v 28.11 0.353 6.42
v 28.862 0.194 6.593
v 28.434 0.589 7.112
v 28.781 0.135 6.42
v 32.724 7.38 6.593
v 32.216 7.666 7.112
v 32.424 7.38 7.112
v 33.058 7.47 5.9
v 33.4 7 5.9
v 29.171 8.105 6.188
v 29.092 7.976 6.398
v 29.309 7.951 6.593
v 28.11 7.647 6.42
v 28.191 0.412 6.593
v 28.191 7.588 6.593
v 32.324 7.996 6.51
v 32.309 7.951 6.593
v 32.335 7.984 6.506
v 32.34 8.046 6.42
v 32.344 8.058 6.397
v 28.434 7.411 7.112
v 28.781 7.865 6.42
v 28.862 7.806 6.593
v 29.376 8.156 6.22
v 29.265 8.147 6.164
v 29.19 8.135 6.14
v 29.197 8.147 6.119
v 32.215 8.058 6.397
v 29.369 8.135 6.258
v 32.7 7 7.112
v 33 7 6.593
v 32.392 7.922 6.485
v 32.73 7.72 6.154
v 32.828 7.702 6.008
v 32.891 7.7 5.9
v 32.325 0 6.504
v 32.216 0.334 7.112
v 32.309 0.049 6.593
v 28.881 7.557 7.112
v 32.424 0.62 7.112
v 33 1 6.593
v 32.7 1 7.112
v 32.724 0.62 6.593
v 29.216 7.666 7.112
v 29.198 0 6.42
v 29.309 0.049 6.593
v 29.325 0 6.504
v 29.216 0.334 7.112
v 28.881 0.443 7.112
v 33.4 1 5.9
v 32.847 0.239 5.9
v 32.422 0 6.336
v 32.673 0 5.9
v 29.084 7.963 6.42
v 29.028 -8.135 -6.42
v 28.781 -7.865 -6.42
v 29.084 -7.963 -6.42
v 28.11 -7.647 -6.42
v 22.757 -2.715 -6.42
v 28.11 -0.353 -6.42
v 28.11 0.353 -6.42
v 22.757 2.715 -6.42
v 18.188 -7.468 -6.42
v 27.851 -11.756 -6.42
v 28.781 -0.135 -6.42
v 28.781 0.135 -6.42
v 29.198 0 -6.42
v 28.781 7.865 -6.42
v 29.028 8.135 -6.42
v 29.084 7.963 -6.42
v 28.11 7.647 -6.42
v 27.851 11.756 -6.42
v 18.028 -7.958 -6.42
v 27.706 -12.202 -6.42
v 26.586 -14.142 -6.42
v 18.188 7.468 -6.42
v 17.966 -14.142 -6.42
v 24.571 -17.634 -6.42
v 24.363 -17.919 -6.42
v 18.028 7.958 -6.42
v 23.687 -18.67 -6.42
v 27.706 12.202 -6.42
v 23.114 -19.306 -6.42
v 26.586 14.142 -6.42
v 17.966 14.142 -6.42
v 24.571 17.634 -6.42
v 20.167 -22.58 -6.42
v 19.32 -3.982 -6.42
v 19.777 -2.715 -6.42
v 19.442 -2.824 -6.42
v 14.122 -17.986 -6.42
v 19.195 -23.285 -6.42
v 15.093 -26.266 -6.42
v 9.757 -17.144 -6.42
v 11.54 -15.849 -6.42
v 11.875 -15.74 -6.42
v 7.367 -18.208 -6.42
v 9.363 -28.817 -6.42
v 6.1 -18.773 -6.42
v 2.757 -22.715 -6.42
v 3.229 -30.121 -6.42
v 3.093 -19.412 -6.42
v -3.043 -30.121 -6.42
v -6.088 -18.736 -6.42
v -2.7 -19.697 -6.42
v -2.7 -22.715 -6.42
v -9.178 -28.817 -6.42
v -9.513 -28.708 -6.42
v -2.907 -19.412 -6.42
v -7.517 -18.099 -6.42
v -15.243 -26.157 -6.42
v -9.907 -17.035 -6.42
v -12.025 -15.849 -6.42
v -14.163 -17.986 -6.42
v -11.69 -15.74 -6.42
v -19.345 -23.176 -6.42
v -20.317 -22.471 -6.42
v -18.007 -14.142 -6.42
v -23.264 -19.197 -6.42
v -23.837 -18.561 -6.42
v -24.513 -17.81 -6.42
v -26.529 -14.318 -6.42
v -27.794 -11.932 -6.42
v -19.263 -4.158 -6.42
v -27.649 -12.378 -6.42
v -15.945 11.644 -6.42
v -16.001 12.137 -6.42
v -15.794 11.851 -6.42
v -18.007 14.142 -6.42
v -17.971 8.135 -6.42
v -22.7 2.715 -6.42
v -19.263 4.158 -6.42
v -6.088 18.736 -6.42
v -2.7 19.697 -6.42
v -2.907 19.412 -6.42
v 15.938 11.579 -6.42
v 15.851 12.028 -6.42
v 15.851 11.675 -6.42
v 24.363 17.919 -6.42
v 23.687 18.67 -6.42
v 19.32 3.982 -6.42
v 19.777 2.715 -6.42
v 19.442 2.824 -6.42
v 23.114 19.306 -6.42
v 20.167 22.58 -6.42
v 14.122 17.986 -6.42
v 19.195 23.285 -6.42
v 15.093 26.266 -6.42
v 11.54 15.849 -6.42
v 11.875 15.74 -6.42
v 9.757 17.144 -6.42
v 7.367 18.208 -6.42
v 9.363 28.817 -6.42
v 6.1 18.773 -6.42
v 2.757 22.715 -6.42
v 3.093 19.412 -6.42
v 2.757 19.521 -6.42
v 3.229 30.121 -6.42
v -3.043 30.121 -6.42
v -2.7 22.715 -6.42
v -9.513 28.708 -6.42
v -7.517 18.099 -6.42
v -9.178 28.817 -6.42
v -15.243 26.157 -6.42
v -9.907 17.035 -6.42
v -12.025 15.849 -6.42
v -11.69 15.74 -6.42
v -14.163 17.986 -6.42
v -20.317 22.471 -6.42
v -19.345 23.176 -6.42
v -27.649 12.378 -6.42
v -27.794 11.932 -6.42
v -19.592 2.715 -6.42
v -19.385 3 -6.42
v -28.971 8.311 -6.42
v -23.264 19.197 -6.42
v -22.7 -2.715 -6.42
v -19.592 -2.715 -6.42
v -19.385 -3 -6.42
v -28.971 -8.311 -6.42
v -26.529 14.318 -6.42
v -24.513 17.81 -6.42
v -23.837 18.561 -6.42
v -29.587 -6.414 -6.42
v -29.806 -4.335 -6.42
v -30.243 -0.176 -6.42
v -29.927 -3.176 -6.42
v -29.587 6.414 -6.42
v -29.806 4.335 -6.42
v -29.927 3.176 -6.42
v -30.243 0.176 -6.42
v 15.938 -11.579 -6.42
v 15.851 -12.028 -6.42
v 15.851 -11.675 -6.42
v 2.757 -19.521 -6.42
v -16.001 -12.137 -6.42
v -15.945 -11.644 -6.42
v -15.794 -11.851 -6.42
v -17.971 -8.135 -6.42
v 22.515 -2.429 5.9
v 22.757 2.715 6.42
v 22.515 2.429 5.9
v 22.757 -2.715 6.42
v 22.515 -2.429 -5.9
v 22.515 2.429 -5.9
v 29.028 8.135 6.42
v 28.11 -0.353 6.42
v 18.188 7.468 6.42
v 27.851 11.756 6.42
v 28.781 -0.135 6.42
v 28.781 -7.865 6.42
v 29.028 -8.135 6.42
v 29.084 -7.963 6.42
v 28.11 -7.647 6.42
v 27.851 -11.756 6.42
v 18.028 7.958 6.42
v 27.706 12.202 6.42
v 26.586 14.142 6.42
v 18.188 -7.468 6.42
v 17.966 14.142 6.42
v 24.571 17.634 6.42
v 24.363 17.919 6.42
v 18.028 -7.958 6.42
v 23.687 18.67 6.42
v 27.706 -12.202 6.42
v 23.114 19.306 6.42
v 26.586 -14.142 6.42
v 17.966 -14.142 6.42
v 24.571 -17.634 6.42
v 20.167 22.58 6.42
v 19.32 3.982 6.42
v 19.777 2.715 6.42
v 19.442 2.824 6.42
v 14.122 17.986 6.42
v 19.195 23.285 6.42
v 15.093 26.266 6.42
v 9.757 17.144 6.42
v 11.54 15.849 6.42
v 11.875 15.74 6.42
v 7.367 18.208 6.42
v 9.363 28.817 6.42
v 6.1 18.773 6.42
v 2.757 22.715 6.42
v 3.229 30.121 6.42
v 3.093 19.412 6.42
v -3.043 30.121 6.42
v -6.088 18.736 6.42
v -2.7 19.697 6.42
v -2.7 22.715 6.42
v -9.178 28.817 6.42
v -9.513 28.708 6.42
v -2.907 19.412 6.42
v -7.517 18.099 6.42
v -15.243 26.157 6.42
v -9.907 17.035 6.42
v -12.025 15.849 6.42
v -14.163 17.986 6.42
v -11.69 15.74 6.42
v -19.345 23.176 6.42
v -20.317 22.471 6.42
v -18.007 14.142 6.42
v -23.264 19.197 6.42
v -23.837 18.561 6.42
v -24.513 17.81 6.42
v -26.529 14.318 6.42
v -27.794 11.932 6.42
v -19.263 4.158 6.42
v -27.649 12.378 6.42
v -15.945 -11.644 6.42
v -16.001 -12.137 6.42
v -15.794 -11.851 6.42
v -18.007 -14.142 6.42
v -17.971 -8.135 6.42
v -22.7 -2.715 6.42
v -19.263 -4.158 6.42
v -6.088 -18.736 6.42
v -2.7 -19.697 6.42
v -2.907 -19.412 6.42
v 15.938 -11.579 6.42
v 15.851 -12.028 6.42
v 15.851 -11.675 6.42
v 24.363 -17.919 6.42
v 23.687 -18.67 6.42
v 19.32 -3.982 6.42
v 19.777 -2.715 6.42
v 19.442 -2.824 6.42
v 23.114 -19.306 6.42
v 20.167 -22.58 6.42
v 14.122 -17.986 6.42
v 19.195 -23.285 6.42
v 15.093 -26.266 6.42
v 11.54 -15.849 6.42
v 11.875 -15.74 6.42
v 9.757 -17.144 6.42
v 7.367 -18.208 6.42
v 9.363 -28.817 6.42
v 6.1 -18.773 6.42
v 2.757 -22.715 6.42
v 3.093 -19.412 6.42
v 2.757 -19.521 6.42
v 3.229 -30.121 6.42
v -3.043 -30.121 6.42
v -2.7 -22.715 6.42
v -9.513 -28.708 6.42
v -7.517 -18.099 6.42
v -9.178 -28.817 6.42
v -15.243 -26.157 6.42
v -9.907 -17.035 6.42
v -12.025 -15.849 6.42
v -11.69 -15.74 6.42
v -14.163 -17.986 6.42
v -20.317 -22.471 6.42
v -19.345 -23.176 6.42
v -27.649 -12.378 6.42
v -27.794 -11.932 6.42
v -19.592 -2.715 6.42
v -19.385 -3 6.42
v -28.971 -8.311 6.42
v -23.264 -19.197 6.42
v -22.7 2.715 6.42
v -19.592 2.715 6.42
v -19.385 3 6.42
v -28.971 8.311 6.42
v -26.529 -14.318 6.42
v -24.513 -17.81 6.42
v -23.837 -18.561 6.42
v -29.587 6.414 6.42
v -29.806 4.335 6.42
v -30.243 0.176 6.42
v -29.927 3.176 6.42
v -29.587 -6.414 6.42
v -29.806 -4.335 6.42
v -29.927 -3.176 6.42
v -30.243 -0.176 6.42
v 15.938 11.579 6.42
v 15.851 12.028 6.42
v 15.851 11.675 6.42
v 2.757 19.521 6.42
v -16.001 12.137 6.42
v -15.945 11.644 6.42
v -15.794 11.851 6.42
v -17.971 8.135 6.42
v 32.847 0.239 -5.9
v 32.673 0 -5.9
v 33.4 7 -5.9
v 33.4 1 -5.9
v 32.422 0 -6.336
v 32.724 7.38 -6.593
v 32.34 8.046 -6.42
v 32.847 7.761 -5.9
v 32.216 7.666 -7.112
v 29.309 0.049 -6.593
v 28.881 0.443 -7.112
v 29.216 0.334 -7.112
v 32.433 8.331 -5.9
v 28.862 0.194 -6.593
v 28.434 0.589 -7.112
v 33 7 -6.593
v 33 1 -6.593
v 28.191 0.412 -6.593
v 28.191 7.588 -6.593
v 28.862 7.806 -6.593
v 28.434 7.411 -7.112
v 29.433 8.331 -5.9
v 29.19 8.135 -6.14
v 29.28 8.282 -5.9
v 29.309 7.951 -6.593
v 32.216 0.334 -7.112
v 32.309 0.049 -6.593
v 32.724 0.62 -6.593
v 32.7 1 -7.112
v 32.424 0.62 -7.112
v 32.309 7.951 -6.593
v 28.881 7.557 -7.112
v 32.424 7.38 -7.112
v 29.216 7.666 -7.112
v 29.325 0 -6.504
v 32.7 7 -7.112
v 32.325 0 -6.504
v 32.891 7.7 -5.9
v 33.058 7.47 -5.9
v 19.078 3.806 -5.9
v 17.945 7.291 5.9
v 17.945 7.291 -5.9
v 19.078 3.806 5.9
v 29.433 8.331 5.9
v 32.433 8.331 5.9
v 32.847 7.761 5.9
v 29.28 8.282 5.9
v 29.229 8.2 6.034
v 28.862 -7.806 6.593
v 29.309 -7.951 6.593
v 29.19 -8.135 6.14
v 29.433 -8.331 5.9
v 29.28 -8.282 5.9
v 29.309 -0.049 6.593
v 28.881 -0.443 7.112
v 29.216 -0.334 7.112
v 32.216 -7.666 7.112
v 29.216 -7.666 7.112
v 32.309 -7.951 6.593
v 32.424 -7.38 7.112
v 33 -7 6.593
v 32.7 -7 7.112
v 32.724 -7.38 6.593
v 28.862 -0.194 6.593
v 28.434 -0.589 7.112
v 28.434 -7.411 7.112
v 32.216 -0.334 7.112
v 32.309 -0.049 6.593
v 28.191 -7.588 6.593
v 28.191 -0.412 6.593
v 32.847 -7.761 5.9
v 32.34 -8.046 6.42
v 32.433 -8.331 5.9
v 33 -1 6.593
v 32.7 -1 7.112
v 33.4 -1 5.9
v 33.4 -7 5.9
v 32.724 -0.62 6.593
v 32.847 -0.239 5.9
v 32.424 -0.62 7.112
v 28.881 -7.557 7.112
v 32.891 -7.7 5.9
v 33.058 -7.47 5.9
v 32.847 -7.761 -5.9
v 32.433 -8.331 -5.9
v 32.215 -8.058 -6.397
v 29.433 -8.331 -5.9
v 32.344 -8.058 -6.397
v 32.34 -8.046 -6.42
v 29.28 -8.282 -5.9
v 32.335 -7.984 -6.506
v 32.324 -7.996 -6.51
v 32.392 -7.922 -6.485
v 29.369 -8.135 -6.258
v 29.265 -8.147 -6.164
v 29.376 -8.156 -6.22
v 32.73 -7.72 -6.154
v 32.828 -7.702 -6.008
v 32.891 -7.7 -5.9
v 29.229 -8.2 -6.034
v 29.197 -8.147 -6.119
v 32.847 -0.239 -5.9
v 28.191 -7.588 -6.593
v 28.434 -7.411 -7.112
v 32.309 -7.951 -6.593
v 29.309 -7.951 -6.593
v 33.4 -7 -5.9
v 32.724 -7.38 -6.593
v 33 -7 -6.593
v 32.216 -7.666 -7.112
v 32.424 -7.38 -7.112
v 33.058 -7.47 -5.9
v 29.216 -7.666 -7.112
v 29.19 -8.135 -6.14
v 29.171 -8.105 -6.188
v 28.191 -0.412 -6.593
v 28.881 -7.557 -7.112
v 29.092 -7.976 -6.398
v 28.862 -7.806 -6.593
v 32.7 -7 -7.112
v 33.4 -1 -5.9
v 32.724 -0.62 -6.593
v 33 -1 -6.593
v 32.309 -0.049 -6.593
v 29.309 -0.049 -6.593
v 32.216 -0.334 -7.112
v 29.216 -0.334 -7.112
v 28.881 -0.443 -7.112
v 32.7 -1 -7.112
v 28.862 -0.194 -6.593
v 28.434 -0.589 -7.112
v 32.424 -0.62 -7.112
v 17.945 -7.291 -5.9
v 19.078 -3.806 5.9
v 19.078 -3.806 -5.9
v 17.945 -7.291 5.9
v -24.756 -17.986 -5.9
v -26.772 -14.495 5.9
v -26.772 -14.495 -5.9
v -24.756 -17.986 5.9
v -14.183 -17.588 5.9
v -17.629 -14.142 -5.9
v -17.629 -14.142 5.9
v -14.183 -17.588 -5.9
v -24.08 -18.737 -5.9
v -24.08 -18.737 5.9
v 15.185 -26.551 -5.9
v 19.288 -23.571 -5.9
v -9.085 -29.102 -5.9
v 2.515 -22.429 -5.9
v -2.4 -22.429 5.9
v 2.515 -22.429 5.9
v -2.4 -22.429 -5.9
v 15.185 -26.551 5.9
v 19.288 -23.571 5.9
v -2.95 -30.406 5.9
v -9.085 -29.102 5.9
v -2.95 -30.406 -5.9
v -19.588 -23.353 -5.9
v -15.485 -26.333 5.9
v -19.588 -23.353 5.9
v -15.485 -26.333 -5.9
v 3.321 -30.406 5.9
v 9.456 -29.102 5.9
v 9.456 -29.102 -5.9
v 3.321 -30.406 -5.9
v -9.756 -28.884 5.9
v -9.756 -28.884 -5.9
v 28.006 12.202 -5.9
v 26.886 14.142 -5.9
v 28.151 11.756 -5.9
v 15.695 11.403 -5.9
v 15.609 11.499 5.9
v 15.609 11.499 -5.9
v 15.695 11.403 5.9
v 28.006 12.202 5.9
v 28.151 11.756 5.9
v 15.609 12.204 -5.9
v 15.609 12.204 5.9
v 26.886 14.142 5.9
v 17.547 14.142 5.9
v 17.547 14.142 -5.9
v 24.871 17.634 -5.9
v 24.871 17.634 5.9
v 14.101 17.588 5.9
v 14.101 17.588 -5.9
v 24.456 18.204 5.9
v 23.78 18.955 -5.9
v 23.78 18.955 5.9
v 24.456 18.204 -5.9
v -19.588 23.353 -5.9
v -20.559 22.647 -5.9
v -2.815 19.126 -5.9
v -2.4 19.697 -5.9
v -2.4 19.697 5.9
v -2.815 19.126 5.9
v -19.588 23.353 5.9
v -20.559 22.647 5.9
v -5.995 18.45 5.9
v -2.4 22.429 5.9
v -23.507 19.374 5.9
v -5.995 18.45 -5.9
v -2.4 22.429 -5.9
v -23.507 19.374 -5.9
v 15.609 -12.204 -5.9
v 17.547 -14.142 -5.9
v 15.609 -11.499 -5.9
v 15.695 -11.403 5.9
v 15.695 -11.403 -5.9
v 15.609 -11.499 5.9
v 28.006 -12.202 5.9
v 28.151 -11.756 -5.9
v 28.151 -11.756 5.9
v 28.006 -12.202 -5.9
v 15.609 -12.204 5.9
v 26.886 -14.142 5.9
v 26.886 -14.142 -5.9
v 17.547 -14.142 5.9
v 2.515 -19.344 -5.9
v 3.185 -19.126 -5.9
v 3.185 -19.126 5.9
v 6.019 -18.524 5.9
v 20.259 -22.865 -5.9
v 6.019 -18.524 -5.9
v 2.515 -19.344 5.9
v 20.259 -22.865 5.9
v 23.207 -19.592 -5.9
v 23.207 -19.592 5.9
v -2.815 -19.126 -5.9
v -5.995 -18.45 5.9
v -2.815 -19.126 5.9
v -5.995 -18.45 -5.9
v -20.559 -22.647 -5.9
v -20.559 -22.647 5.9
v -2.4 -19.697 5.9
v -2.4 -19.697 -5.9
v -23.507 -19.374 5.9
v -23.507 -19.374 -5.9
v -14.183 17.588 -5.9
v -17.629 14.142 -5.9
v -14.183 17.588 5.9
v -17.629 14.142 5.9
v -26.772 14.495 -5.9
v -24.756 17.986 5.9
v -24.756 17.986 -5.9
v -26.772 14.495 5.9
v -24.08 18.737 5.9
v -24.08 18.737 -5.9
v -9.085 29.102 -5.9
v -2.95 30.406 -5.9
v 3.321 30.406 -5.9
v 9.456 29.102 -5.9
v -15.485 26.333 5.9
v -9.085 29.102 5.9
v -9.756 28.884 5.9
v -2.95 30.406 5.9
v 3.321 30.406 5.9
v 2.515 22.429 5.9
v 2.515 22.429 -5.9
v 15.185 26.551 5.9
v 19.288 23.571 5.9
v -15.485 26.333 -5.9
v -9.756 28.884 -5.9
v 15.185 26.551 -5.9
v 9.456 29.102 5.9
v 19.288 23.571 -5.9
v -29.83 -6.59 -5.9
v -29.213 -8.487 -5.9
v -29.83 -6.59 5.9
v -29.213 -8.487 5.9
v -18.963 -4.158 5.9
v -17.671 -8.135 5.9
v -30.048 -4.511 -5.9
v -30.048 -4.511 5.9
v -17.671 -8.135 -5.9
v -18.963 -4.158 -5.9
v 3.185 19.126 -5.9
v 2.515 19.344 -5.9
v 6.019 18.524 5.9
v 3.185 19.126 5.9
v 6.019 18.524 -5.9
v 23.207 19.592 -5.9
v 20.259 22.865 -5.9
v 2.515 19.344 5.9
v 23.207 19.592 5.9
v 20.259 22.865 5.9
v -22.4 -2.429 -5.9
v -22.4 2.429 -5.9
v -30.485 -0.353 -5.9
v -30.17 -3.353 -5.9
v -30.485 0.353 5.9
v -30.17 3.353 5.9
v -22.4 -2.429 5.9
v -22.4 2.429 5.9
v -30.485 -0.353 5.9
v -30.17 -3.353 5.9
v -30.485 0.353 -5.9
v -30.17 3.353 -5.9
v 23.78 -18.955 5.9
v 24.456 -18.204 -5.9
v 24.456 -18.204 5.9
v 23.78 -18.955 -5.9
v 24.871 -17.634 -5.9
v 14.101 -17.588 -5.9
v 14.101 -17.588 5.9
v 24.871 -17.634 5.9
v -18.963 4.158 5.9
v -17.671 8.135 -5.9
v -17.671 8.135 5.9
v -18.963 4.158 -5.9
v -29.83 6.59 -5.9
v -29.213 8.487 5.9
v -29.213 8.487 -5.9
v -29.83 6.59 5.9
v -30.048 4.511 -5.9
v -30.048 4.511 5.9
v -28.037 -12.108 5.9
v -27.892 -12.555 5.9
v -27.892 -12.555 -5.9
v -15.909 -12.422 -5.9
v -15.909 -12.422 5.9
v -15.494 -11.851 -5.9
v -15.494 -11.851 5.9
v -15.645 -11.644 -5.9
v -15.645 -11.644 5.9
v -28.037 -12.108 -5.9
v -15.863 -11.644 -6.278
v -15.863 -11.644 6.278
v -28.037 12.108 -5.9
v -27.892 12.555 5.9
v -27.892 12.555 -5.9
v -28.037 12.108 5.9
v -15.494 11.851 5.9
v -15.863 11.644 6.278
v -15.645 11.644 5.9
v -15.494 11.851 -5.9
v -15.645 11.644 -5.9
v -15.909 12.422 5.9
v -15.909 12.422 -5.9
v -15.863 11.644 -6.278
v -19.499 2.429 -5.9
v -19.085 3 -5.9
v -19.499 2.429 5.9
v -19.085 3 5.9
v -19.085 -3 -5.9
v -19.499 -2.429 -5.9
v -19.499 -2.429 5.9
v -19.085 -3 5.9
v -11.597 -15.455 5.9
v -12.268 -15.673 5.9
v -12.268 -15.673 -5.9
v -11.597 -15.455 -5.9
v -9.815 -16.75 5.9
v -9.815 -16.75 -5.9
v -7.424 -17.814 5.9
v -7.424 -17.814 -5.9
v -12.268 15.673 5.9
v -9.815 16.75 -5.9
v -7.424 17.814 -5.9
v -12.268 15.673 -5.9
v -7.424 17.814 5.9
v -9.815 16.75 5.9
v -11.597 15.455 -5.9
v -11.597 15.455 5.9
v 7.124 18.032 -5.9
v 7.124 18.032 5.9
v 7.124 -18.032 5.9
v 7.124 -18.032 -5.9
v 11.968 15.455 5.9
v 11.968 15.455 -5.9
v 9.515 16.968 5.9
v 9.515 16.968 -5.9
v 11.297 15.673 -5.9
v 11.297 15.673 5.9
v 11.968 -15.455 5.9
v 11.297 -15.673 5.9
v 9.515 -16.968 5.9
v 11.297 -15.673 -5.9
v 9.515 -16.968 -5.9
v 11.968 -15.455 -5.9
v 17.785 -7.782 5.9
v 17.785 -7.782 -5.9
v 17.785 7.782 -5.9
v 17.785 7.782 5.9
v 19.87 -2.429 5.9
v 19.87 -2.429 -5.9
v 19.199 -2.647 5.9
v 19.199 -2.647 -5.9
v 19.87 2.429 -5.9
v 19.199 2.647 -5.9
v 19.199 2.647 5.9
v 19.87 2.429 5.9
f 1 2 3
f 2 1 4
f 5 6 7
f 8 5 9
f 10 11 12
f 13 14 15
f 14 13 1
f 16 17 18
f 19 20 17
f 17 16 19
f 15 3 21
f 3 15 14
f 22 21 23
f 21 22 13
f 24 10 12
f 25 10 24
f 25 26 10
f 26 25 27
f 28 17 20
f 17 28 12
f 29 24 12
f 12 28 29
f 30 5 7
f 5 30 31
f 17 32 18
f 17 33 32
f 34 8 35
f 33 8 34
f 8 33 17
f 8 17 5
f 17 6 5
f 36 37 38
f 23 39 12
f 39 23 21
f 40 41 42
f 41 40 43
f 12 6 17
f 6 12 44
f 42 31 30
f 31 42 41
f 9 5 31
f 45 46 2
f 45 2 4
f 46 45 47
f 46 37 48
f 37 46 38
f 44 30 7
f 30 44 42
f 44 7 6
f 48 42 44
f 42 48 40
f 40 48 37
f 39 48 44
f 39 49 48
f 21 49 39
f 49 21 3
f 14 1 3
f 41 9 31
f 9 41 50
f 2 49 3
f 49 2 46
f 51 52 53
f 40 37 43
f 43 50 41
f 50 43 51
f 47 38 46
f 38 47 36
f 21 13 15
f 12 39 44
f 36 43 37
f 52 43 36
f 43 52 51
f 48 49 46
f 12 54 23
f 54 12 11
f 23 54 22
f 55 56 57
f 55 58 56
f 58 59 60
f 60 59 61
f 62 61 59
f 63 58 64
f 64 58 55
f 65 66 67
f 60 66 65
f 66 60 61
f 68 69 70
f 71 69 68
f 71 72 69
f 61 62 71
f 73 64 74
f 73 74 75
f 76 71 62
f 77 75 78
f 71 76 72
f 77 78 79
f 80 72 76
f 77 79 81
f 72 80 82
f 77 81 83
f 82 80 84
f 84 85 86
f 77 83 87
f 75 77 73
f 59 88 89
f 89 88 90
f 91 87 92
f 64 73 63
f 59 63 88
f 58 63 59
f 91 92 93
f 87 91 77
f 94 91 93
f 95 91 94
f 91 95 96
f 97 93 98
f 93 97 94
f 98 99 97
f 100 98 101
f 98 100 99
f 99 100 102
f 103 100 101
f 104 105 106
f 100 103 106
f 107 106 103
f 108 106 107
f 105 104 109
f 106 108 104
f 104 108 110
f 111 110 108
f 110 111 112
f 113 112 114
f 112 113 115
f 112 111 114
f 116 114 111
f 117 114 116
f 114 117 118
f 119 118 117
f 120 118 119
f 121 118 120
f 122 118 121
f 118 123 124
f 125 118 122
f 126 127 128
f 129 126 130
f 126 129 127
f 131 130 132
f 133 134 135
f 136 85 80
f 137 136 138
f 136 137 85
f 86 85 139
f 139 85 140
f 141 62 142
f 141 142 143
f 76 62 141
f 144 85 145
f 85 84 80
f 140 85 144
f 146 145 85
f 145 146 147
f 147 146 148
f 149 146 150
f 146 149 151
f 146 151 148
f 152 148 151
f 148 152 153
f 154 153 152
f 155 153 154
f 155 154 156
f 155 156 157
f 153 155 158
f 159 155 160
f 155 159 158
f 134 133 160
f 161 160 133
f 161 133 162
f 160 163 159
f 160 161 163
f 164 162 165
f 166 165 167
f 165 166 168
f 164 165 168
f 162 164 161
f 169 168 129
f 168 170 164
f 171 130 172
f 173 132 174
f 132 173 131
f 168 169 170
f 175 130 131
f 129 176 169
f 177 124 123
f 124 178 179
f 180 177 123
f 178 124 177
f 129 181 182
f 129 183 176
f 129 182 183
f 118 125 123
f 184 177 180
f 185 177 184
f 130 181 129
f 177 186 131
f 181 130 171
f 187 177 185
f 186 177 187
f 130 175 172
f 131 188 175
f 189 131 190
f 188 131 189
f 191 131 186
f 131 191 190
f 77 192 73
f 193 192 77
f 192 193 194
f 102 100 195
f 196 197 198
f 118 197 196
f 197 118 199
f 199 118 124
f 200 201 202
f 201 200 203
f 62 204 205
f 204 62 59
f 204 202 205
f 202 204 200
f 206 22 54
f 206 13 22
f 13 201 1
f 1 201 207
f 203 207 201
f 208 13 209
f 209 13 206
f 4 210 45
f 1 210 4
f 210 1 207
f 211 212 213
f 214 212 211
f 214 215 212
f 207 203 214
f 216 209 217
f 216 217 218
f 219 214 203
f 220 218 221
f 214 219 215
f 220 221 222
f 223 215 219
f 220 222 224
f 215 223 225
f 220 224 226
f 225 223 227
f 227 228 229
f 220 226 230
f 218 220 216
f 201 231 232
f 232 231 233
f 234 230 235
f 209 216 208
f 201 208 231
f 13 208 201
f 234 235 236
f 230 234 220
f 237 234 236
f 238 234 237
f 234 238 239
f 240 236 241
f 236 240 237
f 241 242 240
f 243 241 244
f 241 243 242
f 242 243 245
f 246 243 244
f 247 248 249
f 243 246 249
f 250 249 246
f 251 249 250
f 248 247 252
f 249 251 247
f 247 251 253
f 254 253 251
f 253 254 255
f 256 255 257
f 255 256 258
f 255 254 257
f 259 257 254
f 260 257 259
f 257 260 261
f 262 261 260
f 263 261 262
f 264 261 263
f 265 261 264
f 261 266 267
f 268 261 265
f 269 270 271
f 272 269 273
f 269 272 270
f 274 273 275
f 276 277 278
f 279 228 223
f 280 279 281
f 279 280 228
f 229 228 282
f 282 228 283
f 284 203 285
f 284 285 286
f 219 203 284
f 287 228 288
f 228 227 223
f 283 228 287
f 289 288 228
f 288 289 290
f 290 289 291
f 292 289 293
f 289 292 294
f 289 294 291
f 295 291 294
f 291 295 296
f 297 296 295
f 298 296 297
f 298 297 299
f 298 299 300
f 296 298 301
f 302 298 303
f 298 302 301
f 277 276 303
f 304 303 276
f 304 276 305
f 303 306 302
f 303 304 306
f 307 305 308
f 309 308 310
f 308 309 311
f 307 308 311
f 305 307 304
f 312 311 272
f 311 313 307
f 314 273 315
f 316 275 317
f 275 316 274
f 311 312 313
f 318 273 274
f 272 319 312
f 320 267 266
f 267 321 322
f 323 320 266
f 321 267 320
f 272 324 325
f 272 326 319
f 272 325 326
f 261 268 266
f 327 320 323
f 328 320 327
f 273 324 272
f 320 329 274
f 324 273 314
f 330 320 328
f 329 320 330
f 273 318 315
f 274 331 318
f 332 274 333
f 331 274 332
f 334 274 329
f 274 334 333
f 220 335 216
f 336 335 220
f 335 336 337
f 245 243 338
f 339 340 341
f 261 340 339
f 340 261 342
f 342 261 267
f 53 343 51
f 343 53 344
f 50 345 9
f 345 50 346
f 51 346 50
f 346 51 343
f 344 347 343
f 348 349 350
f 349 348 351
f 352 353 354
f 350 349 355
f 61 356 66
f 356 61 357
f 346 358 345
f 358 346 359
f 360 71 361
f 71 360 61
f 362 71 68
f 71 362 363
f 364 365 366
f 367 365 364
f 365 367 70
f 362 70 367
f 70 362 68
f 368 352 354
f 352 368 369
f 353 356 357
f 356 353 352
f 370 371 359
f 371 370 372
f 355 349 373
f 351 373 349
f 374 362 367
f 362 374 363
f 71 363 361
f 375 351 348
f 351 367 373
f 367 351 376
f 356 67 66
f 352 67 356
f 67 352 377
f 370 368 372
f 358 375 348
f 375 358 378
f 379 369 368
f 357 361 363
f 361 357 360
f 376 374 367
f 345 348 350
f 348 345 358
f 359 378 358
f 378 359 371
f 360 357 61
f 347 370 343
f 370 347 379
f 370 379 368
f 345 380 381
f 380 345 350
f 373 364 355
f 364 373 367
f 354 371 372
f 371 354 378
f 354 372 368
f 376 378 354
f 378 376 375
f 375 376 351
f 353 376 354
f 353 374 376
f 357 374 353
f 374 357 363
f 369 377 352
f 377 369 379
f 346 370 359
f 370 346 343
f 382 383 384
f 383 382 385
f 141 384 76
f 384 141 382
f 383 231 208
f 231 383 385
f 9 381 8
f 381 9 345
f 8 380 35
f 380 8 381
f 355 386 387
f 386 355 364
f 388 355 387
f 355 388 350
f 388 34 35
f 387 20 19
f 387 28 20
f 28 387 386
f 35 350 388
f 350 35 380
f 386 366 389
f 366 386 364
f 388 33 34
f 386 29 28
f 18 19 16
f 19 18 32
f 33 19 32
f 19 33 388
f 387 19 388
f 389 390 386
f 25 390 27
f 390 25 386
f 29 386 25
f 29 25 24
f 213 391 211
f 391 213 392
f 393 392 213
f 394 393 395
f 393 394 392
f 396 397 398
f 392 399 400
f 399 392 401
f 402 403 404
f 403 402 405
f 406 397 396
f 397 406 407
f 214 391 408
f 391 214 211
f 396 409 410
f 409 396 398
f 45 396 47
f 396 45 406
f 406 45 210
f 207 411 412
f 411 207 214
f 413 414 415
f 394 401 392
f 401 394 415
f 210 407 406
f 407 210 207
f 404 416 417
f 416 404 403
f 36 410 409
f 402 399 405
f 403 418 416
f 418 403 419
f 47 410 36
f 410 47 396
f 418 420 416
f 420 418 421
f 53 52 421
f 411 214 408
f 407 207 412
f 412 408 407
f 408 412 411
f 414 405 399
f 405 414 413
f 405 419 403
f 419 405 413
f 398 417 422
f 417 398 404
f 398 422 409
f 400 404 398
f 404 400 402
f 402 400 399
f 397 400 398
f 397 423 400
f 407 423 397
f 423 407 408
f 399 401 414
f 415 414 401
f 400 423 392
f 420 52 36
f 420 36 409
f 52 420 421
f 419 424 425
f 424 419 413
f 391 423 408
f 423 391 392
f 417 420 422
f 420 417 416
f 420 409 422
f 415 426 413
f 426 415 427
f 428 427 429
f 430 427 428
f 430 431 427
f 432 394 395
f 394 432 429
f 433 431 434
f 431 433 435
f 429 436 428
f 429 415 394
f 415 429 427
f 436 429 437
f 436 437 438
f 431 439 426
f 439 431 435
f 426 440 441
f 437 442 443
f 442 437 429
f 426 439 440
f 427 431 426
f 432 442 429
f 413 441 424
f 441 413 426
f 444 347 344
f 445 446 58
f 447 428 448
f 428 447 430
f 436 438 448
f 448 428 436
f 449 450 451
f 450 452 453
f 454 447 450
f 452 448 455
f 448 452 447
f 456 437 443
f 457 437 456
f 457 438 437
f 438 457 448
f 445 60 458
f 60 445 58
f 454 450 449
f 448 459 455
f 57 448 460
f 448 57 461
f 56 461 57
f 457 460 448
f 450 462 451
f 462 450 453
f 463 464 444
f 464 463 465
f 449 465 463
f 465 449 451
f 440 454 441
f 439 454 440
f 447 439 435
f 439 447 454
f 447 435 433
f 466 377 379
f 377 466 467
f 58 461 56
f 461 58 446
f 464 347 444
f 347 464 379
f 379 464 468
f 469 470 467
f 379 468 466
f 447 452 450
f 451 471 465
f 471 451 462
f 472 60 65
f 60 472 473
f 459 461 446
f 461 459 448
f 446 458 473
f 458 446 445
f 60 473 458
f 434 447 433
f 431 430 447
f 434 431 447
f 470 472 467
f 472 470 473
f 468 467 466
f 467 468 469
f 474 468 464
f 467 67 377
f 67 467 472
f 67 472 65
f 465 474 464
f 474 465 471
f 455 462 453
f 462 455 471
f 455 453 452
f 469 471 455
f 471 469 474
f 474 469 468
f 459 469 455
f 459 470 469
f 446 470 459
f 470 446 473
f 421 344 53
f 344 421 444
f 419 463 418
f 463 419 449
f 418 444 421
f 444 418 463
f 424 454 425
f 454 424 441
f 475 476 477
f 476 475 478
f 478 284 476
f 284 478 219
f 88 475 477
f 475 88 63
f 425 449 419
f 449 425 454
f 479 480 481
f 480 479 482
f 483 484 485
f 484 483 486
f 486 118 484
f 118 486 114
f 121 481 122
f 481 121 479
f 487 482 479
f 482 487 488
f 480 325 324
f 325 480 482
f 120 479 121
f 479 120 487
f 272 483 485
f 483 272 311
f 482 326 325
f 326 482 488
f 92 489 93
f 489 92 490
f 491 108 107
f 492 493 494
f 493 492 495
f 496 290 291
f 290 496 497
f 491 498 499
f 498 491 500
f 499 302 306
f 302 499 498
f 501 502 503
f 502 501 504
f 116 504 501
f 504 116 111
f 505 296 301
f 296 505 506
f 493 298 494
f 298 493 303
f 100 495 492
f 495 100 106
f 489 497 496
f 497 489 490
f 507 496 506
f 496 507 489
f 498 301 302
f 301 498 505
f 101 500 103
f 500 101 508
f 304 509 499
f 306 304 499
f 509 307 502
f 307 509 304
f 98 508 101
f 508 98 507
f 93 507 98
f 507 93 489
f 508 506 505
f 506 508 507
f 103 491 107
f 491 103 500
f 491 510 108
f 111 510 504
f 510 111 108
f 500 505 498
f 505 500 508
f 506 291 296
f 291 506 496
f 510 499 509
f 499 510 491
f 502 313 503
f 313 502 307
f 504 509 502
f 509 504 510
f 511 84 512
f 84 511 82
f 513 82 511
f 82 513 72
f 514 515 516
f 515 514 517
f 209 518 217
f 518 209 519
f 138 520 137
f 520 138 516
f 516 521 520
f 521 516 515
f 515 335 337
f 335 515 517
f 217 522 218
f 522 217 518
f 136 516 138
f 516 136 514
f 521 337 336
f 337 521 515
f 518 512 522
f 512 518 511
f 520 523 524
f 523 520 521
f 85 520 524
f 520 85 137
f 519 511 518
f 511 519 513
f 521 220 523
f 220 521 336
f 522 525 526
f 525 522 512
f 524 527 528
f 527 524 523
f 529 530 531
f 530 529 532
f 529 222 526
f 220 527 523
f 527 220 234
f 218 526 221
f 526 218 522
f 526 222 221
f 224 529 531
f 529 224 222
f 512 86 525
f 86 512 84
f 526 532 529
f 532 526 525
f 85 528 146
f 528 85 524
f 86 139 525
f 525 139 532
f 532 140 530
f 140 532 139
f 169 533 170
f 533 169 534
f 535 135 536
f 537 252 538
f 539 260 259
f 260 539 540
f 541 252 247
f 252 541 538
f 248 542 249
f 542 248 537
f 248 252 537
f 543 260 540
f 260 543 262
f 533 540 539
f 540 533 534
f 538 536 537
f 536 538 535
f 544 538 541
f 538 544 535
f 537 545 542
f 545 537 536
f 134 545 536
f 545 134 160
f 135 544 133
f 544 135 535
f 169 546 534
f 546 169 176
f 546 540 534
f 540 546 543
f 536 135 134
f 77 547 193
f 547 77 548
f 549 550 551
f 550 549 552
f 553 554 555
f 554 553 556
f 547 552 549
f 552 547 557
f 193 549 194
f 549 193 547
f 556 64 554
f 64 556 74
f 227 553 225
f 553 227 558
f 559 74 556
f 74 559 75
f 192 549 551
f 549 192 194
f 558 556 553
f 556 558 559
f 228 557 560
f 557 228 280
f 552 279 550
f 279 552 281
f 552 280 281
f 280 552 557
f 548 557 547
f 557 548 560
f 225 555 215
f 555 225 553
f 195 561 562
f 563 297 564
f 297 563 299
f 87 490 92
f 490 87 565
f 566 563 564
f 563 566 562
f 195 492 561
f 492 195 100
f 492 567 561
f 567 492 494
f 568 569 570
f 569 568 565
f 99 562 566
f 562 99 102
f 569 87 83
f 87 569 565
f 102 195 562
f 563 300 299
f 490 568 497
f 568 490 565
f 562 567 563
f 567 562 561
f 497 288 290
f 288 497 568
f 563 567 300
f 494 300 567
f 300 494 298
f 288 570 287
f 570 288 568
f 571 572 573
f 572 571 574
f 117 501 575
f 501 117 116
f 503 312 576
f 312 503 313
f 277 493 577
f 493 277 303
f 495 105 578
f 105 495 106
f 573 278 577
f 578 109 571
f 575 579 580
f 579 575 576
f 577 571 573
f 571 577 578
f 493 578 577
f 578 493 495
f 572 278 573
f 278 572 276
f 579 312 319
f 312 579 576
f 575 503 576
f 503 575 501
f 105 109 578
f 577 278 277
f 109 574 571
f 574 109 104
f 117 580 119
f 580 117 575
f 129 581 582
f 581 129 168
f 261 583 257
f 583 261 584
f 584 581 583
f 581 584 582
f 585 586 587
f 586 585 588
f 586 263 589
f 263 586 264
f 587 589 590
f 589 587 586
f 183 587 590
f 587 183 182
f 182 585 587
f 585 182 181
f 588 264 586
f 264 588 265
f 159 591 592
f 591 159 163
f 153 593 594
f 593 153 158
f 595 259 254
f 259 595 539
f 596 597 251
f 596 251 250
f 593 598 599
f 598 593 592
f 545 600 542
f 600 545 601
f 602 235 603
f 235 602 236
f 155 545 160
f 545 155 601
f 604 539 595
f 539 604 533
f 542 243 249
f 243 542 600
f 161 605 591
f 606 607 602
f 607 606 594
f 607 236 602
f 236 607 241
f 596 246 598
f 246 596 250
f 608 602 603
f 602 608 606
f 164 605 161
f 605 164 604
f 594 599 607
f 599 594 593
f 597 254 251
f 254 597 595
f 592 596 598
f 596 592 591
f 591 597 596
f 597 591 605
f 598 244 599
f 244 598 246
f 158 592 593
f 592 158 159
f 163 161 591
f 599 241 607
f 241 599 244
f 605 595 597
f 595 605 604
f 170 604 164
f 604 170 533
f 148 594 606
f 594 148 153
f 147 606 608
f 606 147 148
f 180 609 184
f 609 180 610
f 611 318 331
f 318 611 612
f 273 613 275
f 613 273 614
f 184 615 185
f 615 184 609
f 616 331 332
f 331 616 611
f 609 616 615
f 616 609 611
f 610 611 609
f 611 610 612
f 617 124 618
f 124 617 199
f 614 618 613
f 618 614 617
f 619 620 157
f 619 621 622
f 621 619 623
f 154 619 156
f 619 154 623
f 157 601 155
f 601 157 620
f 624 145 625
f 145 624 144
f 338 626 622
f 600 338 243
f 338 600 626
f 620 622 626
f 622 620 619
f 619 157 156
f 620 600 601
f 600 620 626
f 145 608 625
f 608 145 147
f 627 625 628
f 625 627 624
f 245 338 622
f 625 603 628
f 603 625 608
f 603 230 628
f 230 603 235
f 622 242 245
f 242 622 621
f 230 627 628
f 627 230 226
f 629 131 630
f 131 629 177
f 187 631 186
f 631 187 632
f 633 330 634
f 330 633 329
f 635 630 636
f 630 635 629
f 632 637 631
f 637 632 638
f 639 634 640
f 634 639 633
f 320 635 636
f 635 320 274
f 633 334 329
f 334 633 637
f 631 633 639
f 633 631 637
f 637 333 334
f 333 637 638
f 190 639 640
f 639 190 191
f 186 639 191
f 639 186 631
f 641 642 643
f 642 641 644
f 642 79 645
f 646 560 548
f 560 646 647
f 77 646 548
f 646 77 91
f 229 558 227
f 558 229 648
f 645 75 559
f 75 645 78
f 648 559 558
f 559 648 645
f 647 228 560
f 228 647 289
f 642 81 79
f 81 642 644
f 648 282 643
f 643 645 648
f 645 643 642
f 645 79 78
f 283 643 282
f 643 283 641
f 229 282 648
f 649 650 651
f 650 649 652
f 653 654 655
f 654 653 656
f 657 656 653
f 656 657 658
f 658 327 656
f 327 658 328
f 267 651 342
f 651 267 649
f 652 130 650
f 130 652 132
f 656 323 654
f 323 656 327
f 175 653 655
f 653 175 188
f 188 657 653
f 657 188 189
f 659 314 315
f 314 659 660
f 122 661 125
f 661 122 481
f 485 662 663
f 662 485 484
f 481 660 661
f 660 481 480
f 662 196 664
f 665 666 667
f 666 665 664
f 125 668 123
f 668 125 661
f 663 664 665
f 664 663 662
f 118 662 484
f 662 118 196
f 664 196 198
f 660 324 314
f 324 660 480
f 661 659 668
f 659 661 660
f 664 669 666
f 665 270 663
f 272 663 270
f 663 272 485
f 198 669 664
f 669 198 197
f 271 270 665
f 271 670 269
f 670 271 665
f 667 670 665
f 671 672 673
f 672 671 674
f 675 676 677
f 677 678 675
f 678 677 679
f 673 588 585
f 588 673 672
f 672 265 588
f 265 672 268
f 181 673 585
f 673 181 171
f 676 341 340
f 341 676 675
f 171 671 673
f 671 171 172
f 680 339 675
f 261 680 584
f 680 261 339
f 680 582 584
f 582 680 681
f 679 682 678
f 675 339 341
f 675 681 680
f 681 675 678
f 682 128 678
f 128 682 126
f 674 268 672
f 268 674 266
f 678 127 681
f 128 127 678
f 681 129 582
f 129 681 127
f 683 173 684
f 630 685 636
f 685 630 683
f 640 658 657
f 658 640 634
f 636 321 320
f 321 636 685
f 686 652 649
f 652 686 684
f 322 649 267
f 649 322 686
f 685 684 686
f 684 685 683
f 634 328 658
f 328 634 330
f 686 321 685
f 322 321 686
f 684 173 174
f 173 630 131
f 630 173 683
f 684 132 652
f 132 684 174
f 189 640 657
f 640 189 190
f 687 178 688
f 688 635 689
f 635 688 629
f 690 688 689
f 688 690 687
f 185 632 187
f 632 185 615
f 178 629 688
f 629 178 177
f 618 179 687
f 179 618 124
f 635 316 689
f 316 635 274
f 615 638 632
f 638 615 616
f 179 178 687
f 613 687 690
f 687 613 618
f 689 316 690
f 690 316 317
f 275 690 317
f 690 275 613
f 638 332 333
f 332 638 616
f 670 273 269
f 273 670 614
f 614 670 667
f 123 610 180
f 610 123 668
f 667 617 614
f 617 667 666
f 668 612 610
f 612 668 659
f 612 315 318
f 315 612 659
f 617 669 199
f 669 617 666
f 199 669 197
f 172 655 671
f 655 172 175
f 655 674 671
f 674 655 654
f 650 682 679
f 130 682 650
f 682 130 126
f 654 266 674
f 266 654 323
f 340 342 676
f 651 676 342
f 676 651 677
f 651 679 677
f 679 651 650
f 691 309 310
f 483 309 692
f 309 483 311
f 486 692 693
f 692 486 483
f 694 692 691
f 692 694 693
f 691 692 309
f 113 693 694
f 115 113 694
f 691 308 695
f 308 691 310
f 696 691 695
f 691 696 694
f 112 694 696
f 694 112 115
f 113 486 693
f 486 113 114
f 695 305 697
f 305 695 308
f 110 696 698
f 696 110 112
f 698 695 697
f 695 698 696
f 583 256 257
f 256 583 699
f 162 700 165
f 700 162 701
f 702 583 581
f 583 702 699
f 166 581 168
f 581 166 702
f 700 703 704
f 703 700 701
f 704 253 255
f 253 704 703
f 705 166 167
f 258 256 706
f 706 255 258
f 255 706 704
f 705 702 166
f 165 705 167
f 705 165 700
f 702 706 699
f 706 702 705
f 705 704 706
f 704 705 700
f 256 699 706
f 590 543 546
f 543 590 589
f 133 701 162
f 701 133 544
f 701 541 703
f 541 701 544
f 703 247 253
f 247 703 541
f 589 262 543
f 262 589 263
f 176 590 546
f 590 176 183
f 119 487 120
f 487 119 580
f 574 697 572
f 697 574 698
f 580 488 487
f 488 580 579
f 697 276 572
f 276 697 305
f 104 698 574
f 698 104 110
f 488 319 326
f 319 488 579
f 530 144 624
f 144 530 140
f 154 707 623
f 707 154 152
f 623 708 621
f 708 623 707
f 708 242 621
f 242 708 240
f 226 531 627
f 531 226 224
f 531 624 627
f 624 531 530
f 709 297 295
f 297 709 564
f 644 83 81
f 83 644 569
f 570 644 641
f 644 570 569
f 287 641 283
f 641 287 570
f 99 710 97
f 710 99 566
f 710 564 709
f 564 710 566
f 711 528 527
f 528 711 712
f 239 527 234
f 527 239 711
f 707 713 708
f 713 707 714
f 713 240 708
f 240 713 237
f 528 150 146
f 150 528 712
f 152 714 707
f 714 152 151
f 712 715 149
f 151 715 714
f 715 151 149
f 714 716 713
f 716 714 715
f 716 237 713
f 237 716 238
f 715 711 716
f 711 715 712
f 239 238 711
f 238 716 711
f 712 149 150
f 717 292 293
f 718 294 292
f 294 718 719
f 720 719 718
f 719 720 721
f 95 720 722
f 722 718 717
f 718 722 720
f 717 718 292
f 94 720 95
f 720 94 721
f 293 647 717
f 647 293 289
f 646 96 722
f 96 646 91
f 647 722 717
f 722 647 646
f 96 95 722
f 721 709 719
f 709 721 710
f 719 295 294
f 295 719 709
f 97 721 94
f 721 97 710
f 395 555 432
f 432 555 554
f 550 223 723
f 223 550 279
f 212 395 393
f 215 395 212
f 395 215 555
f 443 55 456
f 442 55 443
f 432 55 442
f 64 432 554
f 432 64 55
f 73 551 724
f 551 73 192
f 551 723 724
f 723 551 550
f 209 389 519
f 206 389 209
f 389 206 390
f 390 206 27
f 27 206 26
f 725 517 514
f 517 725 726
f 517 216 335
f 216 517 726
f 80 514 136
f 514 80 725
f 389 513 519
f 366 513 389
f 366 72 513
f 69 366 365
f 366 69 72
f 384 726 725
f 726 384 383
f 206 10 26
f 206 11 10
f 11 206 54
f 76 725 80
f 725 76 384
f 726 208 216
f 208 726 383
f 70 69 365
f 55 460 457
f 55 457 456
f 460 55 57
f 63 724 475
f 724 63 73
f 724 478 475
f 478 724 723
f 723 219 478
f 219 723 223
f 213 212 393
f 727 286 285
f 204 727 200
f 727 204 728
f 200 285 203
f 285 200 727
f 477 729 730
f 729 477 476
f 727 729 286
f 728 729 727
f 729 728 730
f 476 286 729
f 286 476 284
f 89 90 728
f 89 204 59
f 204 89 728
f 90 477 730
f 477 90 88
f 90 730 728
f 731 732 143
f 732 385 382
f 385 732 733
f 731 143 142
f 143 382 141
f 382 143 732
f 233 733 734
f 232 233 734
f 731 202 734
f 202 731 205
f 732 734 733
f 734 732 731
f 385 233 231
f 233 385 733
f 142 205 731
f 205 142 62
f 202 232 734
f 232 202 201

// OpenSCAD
// Parameters
bbox_x = 60.0; //[30.0:120.0:0.1]
bbox_y = 60.56; //[30.28:121.12:0.1]
thickness_z = 11.8; //[5.9:23.6:0.1]
outer_diameter_x = 60.0; //[30.0:120.0:0.1]
outer_diameter_y = 60.56; //[30.28:121.12:0.1]
inner_diameter = 40.0; //[20.0:80.0:0.1]
notch_count = 8; //[3:24:1]
notch_width_tangential = 6.0; //[2.0:12.0:0.1]
notch_depth_radial = 3.0; //[1.0:8.0:0.1]
tab_count = 2; //[1:2:1]
tab_width_tangential = 6.0; //[2.0:14.0:0.1]
tab_radial_extension = 2.0; //[0.5:6.0:0.1]
tab_gap_tangential = 2.0; //[0.5:10.0:0.1]
tab_angle_center_deg = 0.0; //[-180.0:180.0:1.0]
overlap = 1.0; //[0.5:2.0:0.1]
edge_chamfer = 0.6; //[0.0:2.0:0.1]
tab_rounding_radius = 0.8; //[0.0:3.0:0.1]

// Base Shapes
module annular_ring_body_outer_cyl() {
  cylinder(r=outer_diameter_x/2, h=thickness_z, center=true);
}

module central_through_bore_cyl() {
  cylinder(r=inner_diameter/2, h=thickness_z + 2*overlap, center=true);
}

module notch_cut_box_base() {
  translate([inner_diameter/2 + (notch_depth_radial + overlap)/2 - overlap, 0, 0])
    cube([notch_depth_radial + overlap, notch_width_tangential, thickness_z + 2*overlap], center=true);
}

module tab1_box_base() {
  translate([outer_diameter_x/2 + (tab_radial_extension + overlap)/2 - overlap, (tab_gap_tangential/2 + tab_width_tangential/2), 0])
    cube([tab_radial_extension + overlap, tab_width_tangential, thickness_z], center=true);
}

module tab2_box_base() {
  translate([outer_diameter_x/2 + (tab_radial_extension + overlap)/2 - overlap, -(tab_gap_tangential/2 + tab_width_tangential/2), 0])
    cube([tab_radial_extension + overlap, tab_width_tangential, thickness_z], center=true);
}

module edge_chamfers_or_fillets_sphere() {
  sphere(r=edge_chamfer, center=true);
}

module tab_rounding_sphere() {
  sphere(r=tab_rounding_radius, center=true);
}

// Operations
module annular_ring_body() {
  difference() {
    annular_ring_body_outer_cyl();
    central_through_bore_cyl();
  }
}

module inner_diameter_rectangular_notches_array() {
  union() {
    for (i = [0:notch_count-1]) {
      rotate([0, 0, i*360/notch_count])
        notch_cut_box_base();
    }
  }
}

module annular_ring_with_notches() {
  difference() {
    annular_ring_body();
    inner_diameter_rectangular_notches_array();
  }
}

module outer_rim_key_tabs_pair_unrot() {
  union() {
    tab1_box_base();
    tab2_box_base();
  }
}

module outer_rim_key_tabs_pair() {
  rotate([0, 0, tab_angle_center_deg])
    outer_rim_key_tabs_pair_unrot();
}

module tab_rounding() {
  minkowski() {
    outer_rim_key_tabs_pair();
    tab_rounding_sphere();
  }
}

module ring_with_tabs() {
  union() {
    annular_ring_with_notches();
    tab_rounding();
  }
}

module edge_chamfers_or_fillets() {
  minkowski() {
    ring_with_tabs();
    edge_chamfers_or_fillets_sphere();
  }
}

// Final Output
edge_chamfers_or_fillets();
